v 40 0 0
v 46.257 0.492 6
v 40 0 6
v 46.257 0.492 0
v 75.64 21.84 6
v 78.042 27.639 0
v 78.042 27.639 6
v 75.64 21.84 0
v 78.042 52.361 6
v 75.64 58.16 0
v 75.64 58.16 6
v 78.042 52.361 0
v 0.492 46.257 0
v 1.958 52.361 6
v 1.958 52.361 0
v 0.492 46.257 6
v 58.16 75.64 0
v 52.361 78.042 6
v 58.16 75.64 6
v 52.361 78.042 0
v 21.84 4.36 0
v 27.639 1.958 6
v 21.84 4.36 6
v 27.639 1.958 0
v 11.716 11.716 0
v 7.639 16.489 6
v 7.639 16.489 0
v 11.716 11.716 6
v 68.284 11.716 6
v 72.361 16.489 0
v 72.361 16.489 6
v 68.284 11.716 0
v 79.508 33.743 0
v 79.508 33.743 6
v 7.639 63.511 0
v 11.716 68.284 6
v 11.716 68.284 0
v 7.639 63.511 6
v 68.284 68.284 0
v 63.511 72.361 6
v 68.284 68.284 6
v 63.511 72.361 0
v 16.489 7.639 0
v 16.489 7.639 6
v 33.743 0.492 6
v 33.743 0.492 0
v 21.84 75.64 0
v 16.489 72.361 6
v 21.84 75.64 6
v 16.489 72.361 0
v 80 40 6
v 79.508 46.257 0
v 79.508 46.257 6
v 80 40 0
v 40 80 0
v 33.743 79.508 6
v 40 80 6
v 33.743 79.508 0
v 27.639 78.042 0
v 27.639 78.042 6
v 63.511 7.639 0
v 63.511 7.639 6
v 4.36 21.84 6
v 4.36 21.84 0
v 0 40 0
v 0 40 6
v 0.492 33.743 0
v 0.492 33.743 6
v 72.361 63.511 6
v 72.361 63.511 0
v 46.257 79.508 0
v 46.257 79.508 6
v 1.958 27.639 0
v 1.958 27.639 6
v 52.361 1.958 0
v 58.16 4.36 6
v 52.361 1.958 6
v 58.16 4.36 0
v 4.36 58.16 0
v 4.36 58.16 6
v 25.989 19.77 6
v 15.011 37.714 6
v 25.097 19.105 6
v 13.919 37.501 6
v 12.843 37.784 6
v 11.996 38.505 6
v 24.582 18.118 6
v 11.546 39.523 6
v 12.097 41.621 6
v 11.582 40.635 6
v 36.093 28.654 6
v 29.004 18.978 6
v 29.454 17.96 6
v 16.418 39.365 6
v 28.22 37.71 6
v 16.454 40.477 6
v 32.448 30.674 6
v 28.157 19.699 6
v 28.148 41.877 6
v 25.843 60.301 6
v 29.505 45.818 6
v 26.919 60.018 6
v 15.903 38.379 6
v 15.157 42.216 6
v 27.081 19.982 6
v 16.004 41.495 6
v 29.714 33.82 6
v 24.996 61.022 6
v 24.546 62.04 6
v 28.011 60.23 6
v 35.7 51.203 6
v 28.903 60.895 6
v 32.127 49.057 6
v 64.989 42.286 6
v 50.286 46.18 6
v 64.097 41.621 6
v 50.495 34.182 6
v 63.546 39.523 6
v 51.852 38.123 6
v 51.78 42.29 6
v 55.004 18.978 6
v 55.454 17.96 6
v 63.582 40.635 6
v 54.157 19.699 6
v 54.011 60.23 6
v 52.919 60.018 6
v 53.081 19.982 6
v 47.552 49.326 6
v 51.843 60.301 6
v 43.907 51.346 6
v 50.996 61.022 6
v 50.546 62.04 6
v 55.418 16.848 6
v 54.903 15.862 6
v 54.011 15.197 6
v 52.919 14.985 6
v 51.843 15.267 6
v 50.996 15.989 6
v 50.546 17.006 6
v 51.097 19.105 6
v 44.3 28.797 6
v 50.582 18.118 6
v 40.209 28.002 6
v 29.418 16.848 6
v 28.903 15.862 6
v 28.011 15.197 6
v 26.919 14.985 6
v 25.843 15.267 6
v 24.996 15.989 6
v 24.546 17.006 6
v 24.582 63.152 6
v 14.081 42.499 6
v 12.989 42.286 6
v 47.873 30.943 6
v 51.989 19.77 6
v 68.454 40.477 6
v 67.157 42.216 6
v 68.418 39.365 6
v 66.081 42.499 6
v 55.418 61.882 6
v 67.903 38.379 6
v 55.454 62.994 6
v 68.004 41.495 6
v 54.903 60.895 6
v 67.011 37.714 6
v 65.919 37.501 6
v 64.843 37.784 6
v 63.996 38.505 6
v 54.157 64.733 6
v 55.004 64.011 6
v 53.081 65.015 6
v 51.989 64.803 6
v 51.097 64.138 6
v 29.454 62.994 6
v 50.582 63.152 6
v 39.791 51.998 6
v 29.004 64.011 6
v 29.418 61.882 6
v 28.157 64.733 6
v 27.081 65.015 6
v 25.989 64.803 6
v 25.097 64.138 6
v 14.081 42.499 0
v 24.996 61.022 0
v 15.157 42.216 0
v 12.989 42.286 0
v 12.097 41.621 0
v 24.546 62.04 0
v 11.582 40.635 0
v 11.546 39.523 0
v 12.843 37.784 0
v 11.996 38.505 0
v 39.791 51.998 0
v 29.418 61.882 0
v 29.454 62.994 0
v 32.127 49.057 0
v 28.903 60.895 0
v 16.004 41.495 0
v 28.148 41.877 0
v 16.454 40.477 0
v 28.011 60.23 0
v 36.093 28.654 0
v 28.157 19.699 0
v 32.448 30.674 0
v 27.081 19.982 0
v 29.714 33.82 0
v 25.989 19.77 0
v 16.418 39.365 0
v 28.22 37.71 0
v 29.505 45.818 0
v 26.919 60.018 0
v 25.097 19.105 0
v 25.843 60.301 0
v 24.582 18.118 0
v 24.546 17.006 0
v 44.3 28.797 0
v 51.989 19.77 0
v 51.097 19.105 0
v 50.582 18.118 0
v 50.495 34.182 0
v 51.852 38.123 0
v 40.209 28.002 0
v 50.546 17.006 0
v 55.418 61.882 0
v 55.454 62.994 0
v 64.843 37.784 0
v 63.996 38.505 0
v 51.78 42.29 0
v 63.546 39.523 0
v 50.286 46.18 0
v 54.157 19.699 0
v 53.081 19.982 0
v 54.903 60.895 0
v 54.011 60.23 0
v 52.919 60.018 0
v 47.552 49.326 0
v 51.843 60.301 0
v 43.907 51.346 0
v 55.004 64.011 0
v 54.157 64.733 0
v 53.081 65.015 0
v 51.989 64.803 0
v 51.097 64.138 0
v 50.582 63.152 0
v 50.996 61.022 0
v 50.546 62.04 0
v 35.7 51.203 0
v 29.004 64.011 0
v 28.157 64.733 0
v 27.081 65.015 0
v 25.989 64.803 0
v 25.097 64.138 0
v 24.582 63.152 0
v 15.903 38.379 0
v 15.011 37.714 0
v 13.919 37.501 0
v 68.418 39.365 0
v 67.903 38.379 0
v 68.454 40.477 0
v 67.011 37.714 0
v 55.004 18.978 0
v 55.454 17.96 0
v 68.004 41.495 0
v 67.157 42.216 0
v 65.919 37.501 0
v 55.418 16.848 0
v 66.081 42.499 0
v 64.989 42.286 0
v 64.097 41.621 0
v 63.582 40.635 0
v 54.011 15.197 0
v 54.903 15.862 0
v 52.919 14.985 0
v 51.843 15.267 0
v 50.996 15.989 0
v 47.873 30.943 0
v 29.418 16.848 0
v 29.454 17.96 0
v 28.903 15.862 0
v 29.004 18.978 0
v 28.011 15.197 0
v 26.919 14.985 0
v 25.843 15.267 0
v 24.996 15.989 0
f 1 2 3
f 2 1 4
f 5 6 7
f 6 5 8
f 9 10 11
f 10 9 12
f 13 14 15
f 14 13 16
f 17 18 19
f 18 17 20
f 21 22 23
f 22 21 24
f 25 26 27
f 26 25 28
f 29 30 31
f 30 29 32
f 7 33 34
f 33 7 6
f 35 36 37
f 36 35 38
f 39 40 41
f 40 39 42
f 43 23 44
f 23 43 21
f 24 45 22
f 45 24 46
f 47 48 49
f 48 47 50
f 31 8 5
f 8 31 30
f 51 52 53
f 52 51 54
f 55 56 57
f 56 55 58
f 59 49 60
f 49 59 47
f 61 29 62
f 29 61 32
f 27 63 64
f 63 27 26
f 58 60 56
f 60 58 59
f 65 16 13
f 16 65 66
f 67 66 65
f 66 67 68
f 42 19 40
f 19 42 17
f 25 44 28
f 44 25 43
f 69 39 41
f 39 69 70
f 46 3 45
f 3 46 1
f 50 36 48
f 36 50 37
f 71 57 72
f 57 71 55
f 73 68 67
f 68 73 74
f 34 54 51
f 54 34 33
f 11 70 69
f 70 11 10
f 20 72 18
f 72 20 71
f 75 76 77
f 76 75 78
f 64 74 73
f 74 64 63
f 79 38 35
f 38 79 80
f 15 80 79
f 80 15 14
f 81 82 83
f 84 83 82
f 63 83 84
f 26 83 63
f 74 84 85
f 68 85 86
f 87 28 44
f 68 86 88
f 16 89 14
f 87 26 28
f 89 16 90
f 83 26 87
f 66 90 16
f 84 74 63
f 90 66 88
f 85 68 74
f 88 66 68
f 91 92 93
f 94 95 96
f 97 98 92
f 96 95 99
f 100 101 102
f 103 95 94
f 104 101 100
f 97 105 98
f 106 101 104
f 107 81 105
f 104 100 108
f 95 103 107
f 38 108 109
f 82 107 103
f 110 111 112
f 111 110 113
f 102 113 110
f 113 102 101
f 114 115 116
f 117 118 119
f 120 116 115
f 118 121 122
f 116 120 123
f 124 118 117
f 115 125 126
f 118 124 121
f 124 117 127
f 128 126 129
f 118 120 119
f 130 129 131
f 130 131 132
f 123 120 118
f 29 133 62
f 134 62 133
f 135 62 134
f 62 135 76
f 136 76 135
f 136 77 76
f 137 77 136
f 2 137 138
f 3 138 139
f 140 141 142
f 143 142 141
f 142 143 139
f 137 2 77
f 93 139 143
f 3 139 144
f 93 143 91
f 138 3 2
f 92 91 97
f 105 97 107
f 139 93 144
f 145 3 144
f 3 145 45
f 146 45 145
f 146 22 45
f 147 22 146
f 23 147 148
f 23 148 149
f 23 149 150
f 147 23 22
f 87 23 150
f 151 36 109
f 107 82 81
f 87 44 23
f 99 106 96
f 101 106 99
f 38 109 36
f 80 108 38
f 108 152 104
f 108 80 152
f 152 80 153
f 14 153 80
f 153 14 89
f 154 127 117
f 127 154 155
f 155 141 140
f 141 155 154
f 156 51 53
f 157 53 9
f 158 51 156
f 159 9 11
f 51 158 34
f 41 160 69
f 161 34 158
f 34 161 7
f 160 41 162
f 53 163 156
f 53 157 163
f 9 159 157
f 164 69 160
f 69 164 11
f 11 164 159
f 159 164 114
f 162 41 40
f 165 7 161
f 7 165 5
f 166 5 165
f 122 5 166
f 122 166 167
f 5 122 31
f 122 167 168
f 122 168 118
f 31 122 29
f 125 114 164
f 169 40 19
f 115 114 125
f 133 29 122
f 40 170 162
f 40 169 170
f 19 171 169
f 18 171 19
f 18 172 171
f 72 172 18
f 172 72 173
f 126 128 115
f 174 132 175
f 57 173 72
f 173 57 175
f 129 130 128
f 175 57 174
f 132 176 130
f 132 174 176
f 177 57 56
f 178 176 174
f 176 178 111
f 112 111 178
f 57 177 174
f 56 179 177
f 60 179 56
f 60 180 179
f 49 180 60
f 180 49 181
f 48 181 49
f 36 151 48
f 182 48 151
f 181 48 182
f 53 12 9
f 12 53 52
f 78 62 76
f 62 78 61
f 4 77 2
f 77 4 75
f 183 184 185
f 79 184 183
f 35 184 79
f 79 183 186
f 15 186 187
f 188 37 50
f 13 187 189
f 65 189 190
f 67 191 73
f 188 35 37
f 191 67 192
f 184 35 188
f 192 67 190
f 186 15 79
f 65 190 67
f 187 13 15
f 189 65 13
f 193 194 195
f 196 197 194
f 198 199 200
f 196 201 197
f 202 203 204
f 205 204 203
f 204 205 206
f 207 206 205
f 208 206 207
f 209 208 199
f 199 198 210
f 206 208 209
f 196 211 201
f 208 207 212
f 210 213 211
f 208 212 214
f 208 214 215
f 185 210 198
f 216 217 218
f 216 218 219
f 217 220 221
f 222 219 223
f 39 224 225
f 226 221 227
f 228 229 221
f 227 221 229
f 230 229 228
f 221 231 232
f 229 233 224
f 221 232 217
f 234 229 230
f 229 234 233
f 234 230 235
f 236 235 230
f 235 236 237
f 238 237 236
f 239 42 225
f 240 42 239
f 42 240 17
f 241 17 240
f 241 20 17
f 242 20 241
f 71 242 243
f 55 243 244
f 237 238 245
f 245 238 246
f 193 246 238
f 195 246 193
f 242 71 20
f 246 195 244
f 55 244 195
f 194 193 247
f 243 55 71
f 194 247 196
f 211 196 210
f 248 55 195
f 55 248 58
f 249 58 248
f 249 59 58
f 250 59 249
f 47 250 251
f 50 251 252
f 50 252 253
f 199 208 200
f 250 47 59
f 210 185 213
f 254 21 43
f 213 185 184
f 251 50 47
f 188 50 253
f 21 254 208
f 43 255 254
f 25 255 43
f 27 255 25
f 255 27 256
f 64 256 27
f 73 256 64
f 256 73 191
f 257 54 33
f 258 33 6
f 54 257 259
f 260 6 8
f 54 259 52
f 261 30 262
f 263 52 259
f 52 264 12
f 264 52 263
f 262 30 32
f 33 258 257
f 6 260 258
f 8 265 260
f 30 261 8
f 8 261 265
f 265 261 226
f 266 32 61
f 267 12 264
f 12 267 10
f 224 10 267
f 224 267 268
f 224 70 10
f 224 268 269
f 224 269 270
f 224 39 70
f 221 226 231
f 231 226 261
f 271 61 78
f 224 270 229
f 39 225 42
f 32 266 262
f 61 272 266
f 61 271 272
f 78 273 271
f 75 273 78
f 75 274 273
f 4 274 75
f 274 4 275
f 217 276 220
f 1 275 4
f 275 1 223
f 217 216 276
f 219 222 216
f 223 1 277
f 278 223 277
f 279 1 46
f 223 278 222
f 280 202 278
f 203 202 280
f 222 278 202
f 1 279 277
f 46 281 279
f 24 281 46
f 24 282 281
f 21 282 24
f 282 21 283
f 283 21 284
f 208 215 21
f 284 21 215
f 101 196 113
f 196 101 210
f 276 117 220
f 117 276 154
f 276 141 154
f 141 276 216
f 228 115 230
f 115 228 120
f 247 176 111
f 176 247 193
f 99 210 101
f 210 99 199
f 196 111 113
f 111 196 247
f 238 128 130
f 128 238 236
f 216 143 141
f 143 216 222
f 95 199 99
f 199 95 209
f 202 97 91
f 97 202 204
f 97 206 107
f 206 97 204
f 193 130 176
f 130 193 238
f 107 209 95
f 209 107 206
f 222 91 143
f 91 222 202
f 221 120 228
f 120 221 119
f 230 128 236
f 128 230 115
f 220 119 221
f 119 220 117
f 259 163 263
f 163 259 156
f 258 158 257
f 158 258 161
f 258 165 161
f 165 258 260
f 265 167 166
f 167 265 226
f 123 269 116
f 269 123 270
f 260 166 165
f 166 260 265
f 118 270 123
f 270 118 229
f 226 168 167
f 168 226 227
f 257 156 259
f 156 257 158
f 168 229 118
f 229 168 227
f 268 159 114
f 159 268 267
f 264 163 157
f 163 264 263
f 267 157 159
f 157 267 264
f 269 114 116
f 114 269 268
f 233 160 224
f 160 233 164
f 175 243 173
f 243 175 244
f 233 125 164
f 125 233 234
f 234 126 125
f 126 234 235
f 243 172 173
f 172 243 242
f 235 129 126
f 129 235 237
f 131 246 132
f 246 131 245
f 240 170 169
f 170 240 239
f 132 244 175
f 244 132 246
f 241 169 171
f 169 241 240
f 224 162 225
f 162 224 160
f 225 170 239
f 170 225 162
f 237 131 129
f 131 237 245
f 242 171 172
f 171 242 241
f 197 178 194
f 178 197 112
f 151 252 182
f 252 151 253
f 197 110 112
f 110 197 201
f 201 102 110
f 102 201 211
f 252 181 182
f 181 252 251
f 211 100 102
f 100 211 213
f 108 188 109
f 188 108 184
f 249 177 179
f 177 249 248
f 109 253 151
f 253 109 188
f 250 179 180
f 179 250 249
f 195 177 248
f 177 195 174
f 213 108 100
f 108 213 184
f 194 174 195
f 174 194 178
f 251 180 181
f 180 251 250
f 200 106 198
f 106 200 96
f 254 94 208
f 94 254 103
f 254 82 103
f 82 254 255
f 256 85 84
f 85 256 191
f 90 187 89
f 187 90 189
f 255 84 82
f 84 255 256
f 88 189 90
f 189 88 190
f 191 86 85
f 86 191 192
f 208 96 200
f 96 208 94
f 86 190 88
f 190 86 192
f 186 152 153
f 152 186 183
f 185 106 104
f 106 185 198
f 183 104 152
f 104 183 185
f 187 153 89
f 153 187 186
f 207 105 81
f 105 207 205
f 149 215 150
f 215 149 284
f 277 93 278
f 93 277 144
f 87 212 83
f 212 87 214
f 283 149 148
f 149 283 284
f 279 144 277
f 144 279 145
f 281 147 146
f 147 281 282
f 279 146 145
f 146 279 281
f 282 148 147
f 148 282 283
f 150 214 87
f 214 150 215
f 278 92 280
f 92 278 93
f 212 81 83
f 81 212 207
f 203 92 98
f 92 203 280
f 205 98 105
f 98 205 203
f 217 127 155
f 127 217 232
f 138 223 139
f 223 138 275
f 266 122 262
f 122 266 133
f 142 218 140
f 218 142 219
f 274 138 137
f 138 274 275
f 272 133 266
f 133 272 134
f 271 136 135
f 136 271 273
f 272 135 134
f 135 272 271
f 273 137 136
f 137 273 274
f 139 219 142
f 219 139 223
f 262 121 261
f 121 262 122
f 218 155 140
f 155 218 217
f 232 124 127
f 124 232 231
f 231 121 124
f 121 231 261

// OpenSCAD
$fn = 32;

// ----------------------------------------------------------------------
// Spacer plate: round flange R40, 6 bolts
// ----------------------------------------------------------------------

// --- parameters (mm) ---
bore_r = 12;              // centre bore radius
bolt_r = 2.5;             // bolt hole radius
plate_t = 6;              // plate thickness, Z (extrusion height)
flange_r = 40;            // flange radius
n_bolt = 6;               // bolt hole count
ring_r = 26;              // bolt circle radius

profile = [[80, 40], [79.508, 46.257], [78.042, 52.361], [75.64, 58.16], [72.361, 63.511], [68.284, 68.284], [63.511, 72.361], [58.16, 75.64], [52.361, 78.042], [46.257, 79.508], [40, 80], [33.743, 79.508], [27.639, 78.042], [21.84, 75.64], [16.489, 72.361], [11.716, 68.284], [7.639, 63.511], [4.36, 58.16], [1.958, 52.361], [0.492, 46.257], [0, 40], [0.492, 33.743], [1.958, 27.639], [4.36, 21.84], [7.639, 16.489], [11.716, 11.716], [16.489, 7.639], [21.84, 4.36], [27.639, 1.958], [33.743, 0.492], [40, 0], [46.257, 0.492], [52.361, 1.958], [58.16, 4.36], [63.511, 7.639], [68.284, 11.716], [72.361, 16.489], [75.64, 21.84], [78.042, 27.639], [79.508, 33.743]];  // primary outline, 40 points, counter clockwise
void_1 = [[51.78, 42.29], [50.286, 46.18], [47.552, 49.326], [43.907, 51.346], [39.791, 51.998], [35.7, 51.203], [32.127, 49.057], [29.505, 45.818], [28.148, 41.877], [28.22, 37.71], [29.714, 33.82], [32.448, 30.674], [36.093, 28.654], [40.209, 28.002], [44.3, 28.797], [47.873, 30.943], [50.495, 34.182], [51.852, 38.123]];  // centre bore, 18 points
void_2 = [[68.454, 40.477], [68.004, 41.495], [67.157, 42.216], [66.081, 42.499], [64.989, 42.286], [64.097, 41.621], [63.582, 40.635], [63.546, 39.523], [63.996, 38.505], [64.843, 37.784], [65.919, 37.501], [67.011, 37.714], [67.903, 38.379], [68.418, 39.365]];  // bolt hole 1, 14 points
void_3 = [[55.454, 62.994], [55.004, 64.011], [54.157, 64.733], [53.081, 65.015], [51.989, 64.803], [51.097, 64.138], [50.582, 63.152], [50.546, 62.04], [50.996, 61.022], [51.843, 60.301], [52.919, 60.018], [54.011, 60.23], [54.903, 60.895], [55.418, 61.882]];  // bolt hole 2, 14 points
void_4 = [[29.454, 62.994], [29.004, 64.011], [28.157, 64.733], [27.081, 65.015], [25.989, 64.803], [25.097, 64.138], [24.582, 63.152], [24.546, 62.04], [24.996, 61.022], [25.843, 60.301], [26.919, 60.018], [28.011, 60.23], [28.903, 60.895], [29.418, 61.882]];  // bolt hole 3, 14 points
void_5 = [[16.454, 40.477], [16.004, 41.495], [15.157, 42.216], [14.081, 42.499], [12.989, 42.286], [12.097, 41.621], [11.582, 40.635], [11.546, 39.523], [11.996, 38.505], [12.843, 37.784], [13.919, 37.501], [15.011, 37.714], [15.903, 38.379], [16.418, 39.365]];  // bolt hole 4, 14 points
void_6 = [[29.454, 17.96], [29.004, 18.978], [28.157, 19.699], [27.081, 19.982], [25.989, 19.77], [25.097, 19.105], [24.582, 18.118], [24.546, 17.006], [24.996, 15.989], [25.843, 15.267], [26.919, 14.985], [28.011, 15.197], [28.903, 15.862], [29.418, 16.848]];  // bolt hole 5, 14 points
void_7 = [[55.454, 17.96], [55.004, 18.978], [54.157, 19.699], [53.081, 19.982], [51.989, 19.77], [51.097, 19.105], [50.582, 18.118], [50.546, 17.006], [50.996, 15.989], [51.843, 15.267], [52.919, 14.985], [54.011, 15.197], [54.903, 15.862], [55.418, 16.848]];  // bolt hole 6, 14 points

// --- the one profile operation ---
difference() {
  linear_extrude(height = plate_t) polygon(points = profile);
  translate([0, 0, -1])
    linear_extrude(height = plate_t + 2) polygon(points = void_1);
  translate([0, 0, -1])
    linear_extrude(height = plate_t + 2) polygon(points = void_2);
  translate([0, 0, -1])
    linear_extrude(height = plate_t + 2) polygon(points = void_3);
  translate([0, 0, -1])
    linear_extrude(height = plate_t + 2) polygon(points = void_4);
  translate([0, 0, -1])
    linear_extrude(height = plate_t + 2) polygon(points = void_5);
  translate([0, 0, -1])
    linear_extrude(height = plate_t + 2) polygon(points = void_6);
  translate([0, 0, -1])
    linear_extrude(height = plate_t + 2) polygon(points = void_7);
}
